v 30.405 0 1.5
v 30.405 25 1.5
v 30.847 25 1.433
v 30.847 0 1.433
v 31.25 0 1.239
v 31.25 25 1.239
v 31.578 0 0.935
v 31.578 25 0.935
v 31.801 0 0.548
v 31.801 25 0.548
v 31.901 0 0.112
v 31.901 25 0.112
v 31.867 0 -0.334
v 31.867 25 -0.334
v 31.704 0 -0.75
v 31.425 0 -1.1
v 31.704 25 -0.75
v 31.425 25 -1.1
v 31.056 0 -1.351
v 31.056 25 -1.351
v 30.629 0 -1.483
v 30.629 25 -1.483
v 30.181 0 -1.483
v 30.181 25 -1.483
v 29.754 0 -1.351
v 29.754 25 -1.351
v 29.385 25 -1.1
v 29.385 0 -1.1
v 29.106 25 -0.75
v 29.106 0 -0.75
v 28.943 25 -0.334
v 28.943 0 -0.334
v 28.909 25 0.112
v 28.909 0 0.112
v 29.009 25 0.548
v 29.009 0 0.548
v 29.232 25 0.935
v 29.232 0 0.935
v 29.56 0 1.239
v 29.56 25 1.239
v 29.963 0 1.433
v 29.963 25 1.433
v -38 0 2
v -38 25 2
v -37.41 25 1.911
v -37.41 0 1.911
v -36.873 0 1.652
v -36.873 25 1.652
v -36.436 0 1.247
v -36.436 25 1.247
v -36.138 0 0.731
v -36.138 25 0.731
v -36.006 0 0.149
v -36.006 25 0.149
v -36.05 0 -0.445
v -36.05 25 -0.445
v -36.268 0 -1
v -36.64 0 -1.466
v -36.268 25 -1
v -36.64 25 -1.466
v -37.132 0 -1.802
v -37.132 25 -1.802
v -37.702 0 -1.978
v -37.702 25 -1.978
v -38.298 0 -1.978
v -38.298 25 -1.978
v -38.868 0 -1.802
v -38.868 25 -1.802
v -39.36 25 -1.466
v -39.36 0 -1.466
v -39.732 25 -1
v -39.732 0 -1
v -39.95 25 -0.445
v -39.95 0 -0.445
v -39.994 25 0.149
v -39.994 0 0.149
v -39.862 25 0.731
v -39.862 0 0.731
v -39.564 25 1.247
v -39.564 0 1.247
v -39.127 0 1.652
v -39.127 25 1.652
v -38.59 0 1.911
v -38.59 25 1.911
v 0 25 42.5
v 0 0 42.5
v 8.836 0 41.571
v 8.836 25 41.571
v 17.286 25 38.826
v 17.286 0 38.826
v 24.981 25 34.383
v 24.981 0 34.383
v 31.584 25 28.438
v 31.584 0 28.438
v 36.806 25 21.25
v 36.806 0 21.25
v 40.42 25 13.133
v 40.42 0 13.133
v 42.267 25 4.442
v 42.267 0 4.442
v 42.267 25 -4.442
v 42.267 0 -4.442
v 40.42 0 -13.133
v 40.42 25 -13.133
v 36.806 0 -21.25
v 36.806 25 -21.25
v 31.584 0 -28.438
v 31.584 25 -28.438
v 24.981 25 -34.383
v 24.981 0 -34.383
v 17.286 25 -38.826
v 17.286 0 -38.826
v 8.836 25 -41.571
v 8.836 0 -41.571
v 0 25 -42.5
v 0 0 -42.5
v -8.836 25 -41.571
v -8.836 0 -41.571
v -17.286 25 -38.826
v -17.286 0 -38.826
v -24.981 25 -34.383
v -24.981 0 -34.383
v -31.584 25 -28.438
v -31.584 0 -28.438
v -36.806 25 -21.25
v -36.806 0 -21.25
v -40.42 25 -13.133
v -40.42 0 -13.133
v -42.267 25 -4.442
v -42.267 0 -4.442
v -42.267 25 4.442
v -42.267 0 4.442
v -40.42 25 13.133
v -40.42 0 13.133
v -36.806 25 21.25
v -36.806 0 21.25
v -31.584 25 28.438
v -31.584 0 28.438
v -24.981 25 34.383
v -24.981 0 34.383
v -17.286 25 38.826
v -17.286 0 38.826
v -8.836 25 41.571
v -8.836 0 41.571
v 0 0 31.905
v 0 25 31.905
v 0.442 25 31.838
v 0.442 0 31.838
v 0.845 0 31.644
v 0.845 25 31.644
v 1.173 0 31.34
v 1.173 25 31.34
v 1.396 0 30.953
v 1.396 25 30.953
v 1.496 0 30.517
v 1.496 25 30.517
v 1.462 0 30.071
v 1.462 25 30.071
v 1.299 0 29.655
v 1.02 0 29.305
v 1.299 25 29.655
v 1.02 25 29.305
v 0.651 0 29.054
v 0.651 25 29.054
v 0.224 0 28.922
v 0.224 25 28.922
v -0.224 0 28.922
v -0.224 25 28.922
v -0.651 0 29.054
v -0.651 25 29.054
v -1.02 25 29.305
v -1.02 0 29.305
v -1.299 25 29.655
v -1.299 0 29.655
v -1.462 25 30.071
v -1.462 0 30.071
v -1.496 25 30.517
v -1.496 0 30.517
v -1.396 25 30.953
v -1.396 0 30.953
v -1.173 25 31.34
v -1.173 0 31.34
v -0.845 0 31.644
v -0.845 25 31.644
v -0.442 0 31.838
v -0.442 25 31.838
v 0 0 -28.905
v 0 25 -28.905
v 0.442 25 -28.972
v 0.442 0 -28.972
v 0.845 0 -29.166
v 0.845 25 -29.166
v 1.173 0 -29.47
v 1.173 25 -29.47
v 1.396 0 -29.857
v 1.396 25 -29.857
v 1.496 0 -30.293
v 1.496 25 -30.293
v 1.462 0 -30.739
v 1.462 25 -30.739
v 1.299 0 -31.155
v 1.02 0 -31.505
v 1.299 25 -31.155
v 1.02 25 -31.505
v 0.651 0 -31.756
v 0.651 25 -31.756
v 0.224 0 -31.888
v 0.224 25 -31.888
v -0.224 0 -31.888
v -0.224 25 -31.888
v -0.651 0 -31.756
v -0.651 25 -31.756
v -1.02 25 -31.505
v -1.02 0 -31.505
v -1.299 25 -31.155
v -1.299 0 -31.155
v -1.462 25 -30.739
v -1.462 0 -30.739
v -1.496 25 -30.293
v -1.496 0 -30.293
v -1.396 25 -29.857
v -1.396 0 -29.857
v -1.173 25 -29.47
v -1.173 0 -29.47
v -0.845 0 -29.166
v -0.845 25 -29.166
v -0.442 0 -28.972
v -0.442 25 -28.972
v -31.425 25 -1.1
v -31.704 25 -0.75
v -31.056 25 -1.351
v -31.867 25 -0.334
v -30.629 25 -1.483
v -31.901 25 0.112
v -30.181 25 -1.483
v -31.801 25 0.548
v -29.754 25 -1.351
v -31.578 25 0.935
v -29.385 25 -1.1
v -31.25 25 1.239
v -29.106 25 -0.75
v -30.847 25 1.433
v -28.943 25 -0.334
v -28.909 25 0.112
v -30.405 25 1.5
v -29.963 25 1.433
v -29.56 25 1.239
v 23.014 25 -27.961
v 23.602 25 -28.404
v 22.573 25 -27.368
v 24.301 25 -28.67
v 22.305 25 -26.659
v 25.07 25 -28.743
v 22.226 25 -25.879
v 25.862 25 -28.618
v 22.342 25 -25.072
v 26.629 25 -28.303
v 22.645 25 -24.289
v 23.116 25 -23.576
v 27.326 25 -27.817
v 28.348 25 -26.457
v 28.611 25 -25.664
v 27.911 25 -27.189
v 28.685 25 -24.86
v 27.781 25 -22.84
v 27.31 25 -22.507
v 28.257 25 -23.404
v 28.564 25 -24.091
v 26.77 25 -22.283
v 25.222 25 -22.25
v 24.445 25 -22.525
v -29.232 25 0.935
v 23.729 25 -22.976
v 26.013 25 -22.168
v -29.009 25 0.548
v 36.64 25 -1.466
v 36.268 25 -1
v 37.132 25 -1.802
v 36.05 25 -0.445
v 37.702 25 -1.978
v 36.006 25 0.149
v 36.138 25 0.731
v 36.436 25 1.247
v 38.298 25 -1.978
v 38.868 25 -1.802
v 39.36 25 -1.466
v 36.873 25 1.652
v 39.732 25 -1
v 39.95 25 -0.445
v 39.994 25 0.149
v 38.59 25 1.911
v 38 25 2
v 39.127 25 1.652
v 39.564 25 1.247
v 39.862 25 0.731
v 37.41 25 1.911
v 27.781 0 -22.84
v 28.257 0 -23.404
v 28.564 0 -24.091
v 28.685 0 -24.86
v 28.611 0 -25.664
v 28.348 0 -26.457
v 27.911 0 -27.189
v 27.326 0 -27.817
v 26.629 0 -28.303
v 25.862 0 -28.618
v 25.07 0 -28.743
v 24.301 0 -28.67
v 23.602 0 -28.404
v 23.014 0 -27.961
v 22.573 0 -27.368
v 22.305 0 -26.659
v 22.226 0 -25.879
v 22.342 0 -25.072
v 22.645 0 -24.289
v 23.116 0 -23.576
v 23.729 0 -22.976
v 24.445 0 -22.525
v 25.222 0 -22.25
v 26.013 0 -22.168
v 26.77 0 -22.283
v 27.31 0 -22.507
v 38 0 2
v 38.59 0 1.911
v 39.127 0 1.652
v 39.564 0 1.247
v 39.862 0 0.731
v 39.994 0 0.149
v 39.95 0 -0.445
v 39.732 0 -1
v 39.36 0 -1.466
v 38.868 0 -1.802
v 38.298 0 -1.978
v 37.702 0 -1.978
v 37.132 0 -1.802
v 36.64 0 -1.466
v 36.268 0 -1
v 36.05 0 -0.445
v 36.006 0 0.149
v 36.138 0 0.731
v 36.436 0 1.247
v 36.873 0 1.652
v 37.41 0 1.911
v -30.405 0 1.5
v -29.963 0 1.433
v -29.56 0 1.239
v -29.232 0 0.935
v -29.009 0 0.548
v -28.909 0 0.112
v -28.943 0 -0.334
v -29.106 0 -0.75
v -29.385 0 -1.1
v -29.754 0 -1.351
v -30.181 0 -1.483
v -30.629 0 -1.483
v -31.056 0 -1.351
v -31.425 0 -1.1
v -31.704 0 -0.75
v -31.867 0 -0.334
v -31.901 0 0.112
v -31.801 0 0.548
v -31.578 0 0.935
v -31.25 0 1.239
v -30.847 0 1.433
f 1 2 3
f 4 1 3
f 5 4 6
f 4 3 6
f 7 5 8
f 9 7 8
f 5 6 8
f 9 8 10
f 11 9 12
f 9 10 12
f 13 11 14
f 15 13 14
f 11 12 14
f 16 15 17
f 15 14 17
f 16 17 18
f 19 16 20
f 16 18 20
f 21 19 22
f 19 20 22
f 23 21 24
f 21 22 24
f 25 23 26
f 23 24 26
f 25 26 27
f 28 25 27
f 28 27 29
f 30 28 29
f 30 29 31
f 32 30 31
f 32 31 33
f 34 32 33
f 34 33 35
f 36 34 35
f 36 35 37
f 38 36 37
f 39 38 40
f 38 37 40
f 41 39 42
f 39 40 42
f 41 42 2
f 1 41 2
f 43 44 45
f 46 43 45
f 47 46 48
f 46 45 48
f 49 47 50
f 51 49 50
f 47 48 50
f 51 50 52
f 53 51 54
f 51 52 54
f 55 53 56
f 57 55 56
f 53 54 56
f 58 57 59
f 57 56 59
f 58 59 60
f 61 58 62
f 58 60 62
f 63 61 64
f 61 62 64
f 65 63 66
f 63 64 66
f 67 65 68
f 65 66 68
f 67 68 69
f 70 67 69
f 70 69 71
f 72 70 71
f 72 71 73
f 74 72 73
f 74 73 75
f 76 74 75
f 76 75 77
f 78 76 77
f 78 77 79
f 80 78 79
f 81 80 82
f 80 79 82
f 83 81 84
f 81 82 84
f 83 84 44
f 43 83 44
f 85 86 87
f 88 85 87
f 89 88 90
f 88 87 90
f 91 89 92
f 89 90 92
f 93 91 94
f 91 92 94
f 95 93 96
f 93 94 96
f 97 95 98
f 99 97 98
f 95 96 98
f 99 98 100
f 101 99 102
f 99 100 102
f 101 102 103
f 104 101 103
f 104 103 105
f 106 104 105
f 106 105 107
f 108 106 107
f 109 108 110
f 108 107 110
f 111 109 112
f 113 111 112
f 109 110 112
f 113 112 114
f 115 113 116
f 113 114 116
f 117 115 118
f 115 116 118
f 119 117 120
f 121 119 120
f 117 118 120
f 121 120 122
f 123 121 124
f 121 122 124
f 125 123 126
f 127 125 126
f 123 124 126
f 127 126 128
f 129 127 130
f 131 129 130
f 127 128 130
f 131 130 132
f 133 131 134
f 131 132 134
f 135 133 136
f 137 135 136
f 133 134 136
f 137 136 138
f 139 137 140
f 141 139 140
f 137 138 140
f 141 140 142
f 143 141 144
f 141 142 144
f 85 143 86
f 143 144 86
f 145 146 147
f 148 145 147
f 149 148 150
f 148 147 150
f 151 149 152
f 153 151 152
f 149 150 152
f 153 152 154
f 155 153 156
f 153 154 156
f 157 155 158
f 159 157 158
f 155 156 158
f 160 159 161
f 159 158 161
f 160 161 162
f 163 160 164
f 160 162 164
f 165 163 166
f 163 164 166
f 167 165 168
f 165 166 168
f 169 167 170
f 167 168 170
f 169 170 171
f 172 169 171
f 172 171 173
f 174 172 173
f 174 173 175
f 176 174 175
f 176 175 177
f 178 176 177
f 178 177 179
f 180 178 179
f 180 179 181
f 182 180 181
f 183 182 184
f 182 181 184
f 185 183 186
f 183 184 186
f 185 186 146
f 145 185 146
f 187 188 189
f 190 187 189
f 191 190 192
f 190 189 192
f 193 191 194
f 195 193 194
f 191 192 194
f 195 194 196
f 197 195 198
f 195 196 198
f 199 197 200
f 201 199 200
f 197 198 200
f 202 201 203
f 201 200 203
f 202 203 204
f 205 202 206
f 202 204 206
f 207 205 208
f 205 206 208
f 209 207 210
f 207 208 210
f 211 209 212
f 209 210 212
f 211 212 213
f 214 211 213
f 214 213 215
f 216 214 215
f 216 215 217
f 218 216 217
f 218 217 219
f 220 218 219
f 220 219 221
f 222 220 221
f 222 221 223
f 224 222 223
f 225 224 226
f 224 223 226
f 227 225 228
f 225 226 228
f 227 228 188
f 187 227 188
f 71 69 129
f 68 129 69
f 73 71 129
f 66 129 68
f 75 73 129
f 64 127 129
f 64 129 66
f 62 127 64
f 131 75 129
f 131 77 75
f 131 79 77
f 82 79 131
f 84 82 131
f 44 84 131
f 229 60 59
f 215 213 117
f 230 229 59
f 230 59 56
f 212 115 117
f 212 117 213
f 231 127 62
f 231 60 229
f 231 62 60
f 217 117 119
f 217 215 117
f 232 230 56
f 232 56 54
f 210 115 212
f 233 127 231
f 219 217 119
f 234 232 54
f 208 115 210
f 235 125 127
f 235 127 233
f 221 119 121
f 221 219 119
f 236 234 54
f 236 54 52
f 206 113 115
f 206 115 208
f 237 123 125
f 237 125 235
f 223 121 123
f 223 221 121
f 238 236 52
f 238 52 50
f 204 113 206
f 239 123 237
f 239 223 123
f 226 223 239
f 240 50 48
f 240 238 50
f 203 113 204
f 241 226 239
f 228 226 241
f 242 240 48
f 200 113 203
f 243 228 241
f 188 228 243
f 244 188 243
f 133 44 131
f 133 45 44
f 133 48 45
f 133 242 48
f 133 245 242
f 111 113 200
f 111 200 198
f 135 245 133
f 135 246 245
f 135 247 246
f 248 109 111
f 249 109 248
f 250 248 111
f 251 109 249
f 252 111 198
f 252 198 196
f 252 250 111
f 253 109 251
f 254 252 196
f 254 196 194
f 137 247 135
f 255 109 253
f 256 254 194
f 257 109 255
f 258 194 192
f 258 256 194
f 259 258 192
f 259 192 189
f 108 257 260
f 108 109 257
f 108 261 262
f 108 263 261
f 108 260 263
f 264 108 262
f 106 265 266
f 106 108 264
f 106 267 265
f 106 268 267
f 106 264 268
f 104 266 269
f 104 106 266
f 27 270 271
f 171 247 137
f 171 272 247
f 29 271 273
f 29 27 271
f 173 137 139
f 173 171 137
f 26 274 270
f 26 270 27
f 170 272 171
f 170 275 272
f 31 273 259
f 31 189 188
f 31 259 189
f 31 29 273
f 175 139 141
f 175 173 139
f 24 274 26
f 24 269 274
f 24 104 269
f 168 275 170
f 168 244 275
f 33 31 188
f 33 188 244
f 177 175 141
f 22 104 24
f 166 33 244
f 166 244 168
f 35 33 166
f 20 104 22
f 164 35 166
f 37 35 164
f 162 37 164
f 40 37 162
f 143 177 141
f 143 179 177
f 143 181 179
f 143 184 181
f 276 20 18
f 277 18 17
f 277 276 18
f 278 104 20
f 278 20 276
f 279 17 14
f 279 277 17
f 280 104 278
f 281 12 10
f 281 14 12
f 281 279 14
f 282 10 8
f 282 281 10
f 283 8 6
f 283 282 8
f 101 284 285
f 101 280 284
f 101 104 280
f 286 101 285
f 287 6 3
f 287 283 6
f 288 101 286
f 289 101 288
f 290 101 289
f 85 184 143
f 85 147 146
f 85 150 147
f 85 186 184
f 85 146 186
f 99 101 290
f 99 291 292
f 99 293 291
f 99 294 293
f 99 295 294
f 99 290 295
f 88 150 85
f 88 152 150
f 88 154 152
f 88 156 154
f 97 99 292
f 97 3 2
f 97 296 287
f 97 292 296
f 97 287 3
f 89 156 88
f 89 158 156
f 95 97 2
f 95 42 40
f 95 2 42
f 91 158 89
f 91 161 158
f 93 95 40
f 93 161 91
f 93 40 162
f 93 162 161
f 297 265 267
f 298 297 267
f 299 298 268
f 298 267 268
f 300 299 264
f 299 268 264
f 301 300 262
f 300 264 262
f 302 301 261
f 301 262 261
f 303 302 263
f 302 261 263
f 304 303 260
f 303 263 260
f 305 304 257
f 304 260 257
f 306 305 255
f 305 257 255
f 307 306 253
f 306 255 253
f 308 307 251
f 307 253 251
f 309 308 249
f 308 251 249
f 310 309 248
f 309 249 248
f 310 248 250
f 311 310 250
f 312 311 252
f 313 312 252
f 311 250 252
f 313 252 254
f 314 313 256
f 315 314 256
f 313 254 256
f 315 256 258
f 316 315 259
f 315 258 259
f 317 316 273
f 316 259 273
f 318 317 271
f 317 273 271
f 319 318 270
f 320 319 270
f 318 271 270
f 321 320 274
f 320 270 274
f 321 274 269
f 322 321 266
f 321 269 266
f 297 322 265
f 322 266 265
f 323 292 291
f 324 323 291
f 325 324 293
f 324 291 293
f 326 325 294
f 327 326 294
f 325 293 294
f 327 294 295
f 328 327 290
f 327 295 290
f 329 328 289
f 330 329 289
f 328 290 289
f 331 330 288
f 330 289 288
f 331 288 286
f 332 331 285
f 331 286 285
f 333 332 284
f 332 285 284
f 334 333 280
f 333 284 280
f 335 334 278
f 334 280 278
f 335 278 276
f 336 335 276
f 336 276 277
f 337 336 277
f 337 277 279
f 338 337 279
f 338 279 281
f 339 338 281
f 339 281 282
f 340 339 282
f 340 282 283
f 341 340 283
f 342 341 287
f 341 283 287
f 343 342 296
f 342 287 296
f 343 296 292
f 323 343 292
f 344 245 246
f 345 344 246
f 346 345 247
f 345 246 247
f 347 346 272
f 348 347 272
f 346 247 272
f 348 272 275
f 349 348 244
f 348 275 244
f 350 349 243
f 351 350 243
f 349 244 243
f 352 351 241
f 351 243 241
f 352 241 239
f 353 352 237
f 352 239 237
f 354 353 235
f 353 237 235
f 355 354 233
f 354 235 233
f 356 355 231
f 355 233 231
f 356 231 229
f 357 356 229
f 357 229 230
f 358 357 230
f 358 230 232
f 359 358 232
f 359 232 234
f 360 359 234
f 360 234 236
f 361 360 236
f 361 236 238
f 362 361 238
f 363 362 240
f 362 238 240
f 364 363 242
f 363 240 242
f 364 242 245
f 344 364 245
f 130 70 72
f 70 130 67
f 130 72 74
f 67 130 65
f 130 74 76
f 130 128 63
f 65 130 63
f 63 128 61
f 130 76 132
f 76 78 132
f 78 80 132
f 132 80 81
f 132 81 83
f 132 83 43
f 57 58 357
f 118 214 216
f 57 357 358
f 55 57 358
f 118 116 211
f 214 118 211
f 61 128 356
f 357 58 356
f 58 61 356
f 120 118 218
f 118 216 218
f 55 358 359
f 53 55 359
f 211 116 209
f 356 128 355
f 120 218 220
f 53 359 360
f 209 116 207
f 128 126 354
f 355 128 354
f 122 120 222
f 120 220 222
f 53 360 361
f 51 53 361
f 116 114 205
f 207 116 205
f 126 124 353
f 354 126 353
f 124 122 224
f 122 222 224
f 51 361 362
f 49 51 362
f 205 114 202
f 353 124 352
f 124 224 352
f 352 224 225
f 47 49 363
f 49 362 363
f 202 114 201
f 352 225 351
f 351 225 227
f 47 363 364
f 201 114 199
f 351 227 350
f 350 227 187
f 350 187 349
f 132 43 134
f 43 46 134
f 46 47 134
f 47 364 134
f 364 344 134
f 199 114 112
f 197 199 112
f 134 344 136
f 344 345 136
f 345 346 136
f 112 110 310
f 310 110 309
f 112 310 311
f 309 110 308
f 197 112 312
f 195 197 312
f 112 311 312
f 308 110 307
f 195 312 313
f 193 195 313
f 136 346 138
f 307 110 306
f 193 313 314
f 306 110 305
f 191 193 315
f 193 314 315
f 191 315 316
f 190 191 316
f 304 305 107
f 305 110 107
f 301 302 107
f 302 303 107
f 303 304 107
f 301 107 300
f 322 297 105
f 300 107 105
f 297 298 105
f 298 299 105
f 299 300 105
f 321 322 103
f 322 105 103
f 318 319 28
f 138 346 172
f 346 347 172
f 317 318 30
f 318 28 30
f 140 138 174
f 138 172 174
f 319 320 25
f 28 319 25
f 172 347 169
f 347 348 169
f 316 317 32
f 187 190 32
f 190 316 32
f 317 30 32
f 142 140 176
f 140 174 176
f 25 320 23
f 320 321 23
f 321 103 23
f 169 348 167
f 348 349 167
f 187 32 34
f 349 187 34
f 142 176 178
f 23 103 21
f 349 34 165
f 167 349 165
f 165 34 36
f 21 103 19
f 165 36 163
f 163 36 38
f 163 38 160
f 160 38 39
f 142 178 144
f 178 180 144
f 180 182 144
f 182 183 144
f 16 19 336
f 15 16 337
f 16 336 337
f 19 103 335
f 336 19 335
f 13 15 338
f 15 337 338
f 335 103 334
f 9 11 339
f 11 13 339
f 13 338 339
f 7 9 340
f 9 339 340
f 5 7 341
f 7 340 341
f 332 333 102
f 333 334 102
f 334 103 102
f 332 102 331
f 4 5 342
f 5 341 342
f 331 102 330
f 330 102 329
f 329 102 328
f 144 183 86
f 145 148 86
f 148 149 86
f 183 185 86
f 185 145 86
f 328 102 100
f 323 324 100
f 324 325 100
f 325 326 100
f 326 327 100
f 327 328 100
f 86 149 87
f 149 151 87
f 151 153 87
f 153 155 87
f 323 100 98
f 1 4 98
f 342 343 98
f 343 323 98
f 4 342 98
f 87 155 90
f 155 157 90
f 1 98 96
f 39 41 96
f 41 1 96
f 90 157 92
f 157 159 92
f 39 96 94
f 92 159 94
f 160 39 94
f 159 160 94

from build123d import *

# Parameters (mm, degrees)
CROQUIS1_R              = 42.5
SALIENTE_EXTRUIR1_DEPTH = 25
CROQUIS2_R              = 1.5
CROQUIS2_R_2            = 2
CROQUIS2_RX             = 3.5
CROQUIS2_RY             = 3
CORTAR_EXTRUIR1_DEPTH   = 25


with BuildPart() as part:
    # Croquis1 → Saliente-Extruir1 (new body)
    with BuildSketch(Plane(origin=(0, 0, 0), x_dir=(1, 0, 0), z_dir=(0, 1, 0))):
        with Locations(Location((0, 0, 0), (0, 0, 270))):
            Circle(CROQUIS1_R)
    extrude(amount=SALIENTE_EXTRUIR1_DEPTH)

    # Croquis2 → Cortar-Extruir1 (cut)
    with BuildSketch(Plane(origin=(0, 25, 0), x_dir=(1, 0, 0), z_dir=(0, 1, 0))):
        with Locations(Location((0, 30.405, 0), (0, 0, 270))):
            Circle(CROQUIS2_R)
        with Locations(Location((30.405, 0, 0), (0, 0, 270))):
            Circle(CROQUIS2_R)
        with Locations(Location((0, -30.405, 0), (0, 0, 270))):
            Circle(CROQUIS2_R)
        with Locations(Location((-30.405, 0, 0), (0, 0, 270))):
            Circle(CROQUIS2_R)
        with Locations(Location((-38, 0, 0), (0, 0, 270))):
            Circle(CROQUIS2_R_2)
        with Locations(Location((38, 0, 0), (0, 0, 270))):
            Circle(CROQUIS2_R_2)
        with Locations(Location((25.455844123, 25.455844123), (0, 0, -48.360743663))):
            Ellipse(CROQUIS2_RX, CROQUIS2_RY)
    extrude(amount=-CORTAR_EXTRUIR1_DEPTH, mode=Mode.SUBTRACT)


solid = part.part
